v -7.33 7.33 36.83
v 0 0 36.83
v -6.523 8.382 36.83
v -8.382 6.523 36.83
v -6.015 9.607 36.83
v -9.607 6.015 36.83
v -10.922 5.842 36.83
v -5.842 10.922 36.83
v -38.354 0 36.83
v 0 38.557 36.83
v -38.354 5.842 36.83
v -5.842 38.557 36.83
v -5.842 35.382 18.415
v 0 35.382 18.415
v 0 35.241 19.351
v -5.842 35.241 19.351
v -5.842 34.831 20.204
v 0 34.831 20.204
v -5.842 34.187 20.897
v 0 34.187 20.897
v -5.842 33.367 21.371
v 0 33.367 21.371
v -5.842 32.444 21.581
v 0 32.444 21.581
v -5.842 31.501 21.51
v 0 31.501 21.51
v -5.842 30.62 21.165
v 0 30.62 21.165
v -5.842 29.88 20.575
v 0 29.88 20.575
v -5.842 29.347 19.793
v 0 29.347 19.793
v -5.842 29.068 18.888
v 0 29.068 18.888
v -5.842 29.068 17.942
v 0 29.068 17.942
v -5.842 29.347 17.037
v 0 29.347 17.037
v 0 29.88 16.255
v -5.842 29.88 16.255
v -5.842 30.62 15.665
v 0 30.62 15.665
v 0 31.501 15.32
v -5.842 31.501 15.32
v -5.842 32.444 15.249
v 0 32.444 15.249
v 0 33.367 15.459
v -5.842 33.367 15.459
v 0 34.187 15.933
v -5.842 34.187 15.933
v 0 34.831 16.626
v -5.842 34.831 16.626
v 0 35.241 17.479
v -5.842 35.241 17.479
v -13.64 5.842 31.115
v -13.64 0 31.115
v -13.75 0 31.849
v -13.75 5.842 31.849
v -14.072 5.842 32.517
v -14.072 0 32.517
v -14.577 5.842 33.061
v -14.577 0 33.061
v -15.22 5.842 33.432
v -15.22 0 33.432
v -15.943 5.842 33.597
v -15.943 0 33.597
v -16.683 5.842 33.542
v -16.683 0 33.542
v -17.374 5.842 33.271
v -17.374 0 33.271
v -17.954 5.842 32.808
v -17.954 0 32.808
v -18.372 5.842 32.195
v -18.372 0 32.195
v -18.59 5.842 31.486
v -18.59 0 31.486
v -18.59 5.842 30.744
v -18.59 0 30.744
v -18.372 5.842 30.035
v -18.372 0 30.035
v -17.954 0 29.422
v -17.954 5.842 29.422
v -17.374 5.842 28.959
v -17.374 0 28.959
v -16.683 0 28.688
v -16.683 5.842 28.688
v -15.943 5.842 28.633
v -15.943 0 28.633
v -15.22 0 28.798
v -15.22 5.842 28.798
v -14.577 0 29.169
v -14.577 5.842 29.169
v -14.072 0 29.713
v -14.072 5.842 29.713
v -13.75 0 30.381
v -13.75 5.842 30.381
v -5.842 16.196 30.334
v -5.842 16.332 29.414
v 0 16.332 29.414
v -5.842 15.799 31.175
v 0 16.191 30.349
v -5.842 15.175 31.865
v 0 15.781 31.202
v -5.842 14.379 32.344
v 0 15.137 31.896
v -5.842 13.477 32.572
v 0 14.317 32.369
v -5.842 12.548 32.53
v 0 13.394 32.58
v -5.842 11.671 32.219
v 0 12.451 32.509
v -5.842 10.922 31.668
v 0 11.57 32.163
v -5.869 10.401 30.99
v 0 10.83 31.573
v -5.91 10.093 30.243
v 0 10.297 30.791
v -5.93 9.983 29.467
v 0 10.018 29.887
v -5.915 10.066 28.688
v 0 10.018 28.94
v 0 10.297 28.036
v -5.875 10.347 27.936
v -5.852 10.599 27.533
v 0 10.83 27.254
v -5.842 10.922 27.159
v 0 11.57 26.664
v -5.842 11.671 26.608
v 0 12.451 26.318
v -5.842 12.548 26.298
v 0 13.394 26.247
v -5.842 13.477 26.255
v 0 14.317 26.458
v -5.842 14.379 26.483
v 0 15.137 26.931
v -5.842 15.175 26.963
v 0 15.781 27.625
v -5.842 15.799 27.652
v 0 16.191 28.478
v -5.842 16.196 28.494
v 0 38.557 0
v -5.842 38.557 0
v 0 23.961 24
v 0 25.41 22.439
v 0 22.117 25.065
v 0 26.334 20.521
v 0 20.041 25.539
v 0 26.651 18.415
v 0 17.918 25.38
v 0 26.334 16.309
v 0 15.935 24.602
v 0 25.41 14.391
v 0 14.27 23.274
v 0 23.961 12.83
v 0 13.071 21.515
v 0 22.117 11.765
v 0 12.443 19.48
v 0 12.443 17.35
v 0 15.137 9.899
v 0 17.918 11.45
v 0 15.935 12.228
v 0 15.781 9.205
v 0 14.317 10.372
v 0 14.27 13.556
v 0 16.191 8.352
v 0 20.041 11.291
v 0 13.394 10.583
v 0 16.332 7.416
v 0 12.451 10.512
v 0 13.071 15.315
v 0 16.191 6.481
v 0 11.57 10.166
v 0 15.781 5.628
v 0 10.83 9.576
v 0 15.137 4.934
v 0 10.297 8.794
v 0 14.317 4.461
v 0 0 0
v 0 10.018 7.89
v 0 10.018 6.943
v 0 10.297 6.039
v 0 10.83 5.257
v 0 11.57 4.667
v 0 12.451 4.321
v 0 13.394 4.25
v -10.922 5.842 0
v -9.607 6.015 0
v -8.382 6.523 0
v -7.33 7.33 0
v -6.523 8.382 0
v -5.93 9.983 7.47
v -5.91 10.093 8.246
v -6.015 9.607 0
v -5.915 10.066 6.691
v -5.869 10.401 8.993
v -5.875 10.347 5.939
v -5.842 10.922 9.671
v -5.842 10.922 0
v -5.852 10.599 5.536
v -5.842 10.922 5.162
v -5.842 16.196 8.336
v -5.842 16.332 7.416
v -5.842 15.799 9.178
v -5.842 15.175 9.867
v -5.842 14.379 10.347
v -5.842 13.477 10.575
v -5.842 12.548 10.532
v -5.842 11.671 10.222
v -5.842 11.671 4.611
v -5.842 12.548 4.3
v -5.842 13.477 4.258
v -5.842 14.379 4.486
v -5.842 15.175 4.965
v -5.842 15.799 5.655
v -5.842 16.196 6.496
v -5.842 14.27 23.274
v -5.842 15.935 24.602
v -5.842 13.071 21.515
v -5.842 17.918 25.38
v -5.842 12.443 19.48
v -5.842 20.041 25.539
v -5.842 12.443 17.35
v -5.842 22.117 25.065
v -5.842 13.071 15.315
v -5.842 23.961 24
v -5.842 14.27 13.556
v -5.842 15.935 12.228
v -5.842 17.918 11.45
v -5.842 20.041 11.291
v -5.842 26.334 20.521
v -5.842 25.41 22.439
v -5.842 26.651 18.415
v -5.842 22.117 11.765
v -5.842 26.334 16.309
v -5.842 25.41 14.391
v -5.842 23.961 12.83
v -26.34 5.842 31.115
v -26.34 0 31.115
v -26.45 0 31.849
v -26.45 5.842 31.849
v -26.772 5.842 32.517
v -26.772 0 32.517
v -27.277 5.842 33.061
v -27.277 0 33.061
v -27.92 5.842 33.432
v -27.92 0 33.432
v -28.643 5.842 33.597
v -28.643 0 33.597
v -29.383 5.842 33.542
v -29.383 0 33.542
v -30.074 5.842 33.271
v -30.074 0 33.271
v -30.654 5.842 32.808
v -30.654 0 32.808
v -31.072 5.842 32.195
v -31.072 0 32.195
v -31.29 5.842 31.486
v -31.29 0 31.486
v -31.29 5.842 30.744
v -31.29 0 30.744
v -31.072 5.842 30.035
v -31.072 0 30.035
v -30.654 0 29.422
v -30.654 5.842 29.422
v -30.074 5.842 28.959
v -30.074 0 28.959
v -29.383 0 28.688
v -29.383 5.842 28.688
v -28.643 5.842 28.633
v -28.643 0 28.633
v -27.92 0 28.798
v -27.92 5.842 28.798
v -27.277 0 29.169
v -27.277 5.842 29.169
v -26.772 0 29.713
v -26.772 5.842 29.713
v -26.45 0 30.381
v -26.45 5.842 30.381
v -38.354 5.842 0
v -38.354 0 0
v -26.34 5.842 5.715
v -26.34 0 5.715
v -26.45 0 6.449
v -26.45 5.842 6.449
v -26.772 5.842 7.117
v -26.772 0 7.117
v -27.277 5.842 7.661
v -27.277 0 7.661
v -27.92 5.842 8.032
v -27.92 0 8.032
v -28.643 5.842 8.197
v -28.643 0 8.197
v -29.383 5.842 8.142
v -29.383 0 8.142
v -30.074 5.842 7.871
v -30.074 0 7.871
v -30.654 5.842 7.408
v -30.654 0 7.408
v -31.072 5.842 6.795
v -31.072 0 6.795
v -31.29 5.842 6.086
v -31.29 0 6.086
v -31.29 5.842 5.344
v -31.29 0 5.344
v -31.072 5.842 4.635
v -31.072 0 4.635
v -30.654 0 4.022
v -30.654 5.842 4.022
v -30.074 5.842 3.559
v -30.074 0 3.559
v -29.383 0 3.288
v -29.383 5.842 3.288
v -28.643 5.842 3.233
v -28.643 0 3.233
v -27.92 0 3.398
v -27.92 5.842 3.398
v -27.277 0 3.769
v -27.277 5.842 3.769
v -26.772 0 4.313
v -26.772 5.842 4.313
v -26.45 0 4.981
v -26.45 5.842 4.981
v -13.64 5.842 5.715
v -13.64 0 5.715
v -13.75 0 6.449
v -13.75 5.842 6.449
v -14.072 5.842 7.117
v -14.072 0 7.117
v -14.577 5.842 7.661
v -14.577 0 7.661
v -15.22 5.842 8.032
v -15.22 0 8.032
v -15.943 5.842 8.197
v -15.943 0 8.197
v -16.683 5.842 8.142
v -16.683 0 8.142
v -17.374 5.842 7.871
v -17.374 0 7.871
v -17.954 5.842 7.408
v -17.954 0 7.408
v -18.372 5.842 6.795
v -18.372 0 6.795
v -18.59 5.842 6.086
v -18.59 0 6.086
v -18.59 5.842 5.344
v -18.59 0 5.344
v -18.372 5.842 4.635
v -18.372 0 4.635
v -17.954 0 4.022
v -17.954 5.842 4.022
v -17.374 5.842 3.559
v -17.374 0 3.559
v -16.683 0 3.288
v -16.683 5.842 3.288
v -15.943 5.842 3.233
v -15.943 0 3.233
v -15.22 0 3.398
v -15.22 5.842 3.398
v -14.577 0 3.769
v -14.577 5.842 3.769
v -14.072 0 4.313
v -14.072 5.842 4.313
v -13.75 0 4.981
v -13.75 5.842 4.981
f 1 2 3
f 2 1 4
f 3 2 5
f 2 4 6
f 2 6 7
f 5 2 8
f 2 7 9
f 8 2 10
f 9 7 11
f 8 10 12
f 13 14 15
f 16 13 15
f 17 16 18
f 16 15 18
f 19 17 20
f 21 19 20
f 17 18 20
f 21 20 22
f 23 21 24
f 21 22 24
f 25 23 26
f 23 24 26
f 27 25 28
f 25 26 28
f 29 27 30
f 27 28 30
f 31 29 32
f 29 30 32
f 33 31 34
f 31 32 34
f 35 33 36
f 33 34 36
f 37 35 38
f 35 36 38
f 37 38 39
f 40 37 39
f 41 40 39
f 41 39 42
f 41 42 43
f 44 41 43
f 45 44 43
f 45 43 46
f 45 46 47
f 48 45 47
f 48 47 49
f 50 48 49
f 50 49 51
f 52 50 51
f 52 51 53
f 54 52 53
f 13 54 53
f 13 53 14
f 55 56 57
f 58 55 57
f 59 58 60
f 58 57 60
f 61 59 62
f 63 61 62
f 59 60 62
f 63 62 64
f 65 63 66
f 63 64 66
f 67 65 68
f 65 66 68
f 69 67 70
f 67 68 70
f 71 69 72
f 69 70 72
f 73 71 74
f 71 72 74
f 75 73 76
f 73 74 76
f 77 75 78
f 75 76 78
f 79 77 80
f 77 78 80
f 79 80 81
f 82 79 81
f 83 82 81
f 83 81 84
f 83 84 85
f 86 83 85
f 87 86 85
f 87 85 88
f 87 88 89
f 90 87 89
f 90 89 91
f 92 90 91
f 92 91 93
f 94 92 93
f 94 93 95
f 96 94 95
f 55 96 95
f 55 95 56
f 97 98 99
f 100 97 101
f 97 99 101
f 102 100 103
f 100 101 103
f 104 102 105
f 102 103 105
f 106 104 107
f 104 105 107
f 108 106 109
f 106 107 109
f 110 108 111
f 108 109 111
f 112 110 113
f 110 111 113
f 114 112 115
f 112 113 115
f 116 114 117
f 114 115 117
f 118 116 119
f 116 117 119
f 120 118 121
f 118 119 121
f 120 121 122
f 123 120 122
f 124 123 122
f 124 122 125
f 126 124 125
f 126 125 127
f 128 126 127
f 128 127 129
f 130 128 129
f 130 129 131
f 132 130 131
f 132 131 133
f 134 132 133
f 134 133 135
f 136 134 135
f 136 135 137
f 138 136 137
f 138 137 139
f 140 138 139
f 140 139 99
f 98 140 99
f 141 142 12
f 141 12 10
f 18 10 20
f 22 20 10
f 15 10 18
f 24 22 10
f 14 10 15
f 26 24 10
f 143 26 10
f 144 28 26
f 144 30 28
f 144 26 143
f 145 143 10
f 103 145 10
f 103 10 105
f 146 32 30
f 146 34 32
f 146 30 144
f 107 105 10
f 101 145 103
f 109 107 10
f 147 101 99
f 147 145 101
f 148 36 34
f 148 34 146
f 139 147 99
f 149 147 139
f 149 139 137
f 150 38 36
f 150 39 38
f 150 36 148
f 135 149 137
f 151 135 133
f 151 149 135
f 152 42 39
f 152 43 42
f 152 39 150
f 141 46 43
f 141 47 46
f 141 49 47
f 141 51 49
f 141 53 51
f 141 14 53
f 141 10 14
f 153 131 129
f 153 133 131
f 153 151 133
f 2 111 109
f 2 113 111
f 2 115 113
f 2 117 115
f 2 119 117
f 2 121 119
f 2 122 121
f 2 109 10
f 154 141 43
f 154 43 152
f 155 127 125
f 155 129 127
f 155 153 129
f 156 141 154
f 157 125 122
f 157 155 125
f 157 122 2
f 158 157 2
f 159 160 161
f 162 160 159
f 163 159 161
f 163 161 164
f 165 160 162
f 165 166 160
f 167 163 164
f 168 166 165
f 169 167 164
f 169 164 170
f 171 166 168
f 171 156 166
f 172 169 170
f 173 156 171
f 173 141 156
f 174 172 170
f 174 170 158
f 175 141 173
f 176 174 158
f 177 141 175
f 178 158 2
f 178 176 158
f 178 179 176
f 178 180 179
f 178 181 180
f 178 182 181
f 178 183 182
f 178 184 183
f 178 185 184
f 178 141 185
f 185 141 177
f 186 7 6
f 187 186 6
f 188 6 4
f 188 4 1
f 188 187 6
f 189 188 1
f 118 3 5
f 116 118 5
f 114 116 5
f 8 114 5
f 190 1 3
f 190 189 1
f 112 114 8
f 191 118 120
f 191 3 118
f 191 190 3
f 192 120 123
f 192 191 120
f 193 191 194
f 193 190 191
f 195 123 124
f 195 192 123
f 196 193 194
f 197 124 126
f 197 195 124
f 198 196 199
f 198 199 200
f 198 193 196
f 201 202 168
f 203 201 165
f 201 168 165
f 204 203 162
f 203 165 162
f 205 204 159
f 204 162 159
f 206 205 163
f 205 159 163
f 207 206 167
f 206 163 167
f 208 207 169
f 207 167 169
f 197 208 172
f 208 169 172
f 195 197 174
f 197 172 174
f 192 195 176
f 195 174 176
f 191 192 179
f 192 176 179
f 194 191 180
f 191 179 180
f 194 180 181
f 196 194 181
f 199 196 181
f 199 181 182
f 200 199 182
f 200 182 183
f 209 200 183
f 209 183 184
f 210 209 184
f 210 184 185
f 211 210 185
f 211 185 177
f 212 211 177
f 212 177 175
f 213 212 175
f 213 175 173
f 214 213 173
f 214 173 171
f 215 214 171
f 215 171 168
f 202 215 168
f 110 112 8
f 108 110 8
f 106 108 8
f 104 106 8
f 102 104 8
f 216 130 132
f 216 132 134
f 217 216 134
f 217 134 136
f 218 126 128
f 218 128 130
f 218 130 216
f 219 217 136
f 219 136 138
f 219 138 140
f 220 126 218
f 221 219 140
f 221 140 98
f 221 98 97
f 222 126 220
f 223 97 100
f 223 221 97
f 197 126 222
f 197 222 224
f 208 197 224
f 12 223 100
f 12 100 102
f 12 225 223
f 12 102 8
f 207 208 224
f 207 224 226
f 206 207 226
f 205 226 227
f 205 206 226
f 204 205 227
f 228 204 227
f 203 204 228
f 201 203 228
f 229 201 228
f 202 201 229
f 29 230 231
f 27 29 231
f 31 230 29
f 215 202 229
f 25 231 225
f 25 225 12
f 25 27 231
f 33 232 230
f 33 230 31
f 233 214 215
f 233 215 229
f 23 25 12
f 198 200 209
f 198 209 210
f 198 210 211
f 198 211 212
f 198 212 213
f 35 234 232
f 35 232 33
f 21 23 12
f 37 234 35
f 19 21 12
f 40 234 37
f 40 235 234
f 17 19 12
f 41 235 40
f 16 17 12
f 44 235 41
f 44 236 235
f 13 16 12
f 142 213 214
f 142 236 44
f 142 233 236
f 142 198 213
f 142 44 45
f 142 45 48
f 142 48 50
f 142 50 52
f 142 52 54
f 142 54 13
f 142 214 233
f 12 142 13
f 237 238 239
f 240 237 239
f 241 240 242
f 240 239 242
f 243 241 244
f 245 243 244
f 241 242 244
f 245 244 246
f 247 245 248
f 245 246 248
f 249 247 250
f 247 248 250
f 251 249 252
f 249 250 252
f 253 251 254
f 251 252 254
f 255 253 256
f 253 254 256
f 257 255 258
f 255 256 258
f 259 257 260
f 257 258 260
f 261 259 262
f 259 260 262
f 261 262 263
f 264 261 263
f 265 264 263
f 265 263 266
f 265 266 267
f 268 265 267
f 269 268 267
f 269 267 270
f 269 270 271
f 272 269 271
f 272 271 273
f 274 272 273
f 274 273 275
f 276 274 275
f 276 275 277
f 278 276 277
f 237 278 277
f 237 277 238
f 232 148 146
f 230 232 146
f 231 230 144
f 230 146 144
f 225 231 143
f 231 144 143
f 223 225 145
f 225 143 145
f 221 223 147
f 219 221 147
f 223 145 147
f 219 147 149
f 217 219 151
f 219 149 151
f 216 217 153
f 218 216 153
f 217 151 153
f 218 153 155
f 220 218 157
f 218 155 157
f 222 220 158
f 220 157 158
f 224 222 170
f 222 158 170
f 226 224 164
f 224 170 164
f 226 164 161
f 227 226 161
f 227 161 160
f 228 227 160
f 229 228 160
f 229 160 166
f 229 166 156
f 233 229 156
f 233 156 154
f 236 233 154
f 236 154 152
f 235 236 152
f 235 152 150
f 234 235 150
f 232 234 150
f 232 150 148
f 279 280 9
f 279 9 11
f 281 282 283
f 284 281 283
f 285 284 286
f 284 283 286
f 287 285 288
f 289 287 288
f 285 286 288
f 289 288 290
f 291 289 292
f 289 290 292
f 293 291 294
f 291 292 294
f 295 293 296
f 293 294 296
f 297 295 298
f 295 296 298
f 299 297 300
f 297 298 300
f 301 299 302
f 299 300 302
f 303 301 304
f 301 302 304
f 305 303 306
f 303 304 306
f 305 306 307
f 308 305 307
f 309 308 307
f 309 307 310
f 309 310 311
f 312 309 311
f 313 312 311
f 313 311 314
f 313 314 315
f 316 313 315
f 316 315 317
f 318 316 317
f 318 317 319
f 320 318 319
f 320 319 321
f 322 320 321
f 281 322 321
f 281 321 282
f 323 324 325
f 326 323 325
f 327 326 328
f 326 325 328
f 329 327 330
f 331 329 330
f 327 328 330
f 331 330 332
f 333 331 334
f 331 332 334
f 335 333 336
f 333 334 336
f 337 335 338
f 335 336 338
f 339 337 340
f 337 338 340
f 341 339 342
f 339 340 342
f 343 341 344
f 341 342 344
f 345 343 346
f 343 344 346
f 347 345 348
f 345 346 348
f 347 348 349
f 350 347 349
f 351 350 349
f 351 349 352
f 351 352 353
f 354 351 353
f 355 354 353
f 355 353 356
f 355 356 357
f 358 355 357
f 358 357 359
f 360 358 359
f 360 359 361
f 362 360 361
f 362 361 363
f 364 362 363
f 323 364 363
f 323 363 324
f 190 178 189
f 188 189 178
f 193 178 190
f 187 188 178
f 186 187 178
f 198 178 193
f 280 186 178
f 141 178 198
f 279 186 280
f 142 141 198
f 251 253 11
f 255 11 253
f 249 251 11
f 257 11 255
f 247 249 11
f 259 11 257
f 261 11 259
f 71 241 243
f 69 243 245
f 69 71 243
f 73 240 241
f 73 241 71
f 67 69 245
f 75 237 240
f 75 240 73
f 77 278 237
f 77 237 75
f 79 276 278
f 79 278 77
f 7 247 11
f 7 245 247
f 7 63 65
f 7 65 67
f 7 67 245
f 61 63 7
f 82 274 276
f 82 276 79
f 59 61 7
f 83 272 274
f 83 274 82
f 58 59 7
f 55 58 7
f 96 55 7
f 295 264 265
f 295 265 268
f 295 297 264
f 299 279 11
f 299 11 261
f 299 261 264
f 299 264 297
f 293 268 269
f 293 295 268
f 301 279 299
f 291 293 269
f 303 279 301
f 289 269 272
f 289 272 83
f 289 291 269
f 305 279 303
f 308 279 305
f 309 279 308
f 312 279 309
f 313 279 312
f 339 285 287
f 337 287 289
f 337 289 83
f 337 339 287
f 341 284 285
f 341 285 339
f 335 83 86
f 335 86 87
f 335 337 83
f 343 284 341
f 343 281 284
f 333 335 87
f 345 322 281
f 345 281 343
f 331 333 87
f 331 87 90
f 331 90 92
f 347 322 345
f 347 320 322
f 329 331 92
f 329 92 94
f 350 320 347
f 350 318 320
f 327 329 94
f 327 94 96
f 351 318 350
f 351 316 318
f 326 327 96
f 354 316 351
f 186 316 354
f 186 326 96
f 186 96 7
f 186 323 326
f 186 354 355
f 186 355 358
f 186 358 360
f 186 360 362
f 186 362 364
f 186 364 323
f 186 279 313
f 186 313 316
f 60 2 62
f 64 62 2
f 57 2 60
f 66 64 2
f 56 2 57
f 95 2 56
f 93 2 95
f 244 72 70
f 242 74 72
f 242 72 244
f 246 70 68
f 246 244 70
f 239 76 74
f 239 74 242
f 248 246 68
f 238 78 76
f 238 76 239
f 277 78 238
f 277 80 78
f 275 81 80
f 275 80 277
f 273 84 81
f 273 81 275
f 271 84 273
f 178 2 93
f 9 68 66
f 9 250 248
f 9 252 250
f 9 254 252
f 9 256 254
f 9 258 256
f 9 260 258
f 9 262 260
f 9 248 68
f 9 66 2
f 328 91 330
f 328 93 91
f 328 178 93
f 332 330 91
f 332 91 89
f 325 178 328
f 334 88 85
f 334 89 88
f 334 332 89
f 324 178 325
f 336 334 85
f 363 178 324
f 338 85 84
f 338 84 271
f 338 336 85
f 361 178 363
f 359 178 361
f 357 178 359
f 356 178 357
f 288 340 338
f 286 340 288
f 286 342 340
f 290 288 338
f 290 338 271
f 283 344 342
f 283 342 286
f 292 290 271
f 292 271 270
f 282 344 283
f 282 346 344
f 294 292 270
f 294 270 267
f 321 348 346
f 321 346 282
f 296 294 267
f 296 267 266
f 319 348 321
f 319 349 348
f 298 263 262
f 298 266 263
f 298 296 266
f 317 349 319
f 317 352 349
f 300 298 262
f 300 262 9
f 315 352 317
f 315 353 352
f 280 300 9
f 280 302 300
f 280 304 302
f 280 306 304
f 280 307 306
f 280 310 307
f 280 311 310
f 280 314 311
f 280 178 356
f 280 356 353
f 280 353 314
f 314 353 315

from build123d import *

# Parameters (mm, degrees)
BOSS_EXTRUDE1_DEPTH = 36.83
SKETCH2_R           = 7.14375
SKETCH2_R_2         = 3.175
CUT_EXTRUDE1_DEPTH  = 66.682081939
SKETCH3_R           = 2.4892
CUT_EXTRUDE2_DEPTH  = 66.682081995


with BuildPart() as part:
    # Sketch1 → Boss-Extrude1 (new body)
    with BuildSketch(Plane.XY):
        with BuildLine():
            Line((0, 38.5572), (0, 0))
            Line((0, 0), (-38.354, 0))
            Line((-38.354, 0), (-38.354, 5.842))
            Line((-38.354, 5.842), (-10.922, 5.842))
            ThreePointArc((-10.922, 5.842), (-7.329897552, 7.329897552), (-5.842, 10.922))
            Line((-5.842, 10.922), (-5.842, 38.5572))
            Line((-5.842, 38.5572), (0, 38.5572))
        make_face()
    extrude(amount=BOSS_EXTRUDE1_DEPTH)

    # Sketch2 → Cut-Extrude1 (cut, through all)
    with BuildSketch(Plane(origin=(0, 0, 0), x_dir=(0, 0, -1), z_dir=(1, 0, 0))):
        with Locations(Location((-18.415, 19.5072, 0), (0, 0, 90))):
            Circle(SKETCH2_R)
        with Locations(Location((-18.415, 32.2072, 0), (0, 0, 90))):
            Circle(SKETCH2_R_2)
        with Locations(Location((-7.416477372, 13.1572, 0), (0, 0, 90))):
            Circle(SKETCH2_R_2)
        with Locations(Location((-29.413522628, 13.1572, 0), (0, 0, 90))):
            Circle(SKETCH2_R_2)
    extrude(amount=-CUT_EXTRUDE1_DEPTH, mode=Mode.SUBTRACT)

    # Sketch3 → Cut-Extrude2 (cut, through all)
    with BuildSketch(Plane.XZ):
        with Locations((-28.829, 31.115)):
            Circle(SKETCH3_R)
        with Locations((-16.129, 31.115)):
            Circle(SKETCH3_R)
        with Locations((-16.129, 5.715)):
            Circle(SKETCH3_R)
        with Locations((-28.829, 5.715)):
            Circle(SKETCH3_R)
    extrude(amount=-CUT_EXTRUDE2_DEPTH, mode=Mode.SUBTRACT)


solid = part.part
